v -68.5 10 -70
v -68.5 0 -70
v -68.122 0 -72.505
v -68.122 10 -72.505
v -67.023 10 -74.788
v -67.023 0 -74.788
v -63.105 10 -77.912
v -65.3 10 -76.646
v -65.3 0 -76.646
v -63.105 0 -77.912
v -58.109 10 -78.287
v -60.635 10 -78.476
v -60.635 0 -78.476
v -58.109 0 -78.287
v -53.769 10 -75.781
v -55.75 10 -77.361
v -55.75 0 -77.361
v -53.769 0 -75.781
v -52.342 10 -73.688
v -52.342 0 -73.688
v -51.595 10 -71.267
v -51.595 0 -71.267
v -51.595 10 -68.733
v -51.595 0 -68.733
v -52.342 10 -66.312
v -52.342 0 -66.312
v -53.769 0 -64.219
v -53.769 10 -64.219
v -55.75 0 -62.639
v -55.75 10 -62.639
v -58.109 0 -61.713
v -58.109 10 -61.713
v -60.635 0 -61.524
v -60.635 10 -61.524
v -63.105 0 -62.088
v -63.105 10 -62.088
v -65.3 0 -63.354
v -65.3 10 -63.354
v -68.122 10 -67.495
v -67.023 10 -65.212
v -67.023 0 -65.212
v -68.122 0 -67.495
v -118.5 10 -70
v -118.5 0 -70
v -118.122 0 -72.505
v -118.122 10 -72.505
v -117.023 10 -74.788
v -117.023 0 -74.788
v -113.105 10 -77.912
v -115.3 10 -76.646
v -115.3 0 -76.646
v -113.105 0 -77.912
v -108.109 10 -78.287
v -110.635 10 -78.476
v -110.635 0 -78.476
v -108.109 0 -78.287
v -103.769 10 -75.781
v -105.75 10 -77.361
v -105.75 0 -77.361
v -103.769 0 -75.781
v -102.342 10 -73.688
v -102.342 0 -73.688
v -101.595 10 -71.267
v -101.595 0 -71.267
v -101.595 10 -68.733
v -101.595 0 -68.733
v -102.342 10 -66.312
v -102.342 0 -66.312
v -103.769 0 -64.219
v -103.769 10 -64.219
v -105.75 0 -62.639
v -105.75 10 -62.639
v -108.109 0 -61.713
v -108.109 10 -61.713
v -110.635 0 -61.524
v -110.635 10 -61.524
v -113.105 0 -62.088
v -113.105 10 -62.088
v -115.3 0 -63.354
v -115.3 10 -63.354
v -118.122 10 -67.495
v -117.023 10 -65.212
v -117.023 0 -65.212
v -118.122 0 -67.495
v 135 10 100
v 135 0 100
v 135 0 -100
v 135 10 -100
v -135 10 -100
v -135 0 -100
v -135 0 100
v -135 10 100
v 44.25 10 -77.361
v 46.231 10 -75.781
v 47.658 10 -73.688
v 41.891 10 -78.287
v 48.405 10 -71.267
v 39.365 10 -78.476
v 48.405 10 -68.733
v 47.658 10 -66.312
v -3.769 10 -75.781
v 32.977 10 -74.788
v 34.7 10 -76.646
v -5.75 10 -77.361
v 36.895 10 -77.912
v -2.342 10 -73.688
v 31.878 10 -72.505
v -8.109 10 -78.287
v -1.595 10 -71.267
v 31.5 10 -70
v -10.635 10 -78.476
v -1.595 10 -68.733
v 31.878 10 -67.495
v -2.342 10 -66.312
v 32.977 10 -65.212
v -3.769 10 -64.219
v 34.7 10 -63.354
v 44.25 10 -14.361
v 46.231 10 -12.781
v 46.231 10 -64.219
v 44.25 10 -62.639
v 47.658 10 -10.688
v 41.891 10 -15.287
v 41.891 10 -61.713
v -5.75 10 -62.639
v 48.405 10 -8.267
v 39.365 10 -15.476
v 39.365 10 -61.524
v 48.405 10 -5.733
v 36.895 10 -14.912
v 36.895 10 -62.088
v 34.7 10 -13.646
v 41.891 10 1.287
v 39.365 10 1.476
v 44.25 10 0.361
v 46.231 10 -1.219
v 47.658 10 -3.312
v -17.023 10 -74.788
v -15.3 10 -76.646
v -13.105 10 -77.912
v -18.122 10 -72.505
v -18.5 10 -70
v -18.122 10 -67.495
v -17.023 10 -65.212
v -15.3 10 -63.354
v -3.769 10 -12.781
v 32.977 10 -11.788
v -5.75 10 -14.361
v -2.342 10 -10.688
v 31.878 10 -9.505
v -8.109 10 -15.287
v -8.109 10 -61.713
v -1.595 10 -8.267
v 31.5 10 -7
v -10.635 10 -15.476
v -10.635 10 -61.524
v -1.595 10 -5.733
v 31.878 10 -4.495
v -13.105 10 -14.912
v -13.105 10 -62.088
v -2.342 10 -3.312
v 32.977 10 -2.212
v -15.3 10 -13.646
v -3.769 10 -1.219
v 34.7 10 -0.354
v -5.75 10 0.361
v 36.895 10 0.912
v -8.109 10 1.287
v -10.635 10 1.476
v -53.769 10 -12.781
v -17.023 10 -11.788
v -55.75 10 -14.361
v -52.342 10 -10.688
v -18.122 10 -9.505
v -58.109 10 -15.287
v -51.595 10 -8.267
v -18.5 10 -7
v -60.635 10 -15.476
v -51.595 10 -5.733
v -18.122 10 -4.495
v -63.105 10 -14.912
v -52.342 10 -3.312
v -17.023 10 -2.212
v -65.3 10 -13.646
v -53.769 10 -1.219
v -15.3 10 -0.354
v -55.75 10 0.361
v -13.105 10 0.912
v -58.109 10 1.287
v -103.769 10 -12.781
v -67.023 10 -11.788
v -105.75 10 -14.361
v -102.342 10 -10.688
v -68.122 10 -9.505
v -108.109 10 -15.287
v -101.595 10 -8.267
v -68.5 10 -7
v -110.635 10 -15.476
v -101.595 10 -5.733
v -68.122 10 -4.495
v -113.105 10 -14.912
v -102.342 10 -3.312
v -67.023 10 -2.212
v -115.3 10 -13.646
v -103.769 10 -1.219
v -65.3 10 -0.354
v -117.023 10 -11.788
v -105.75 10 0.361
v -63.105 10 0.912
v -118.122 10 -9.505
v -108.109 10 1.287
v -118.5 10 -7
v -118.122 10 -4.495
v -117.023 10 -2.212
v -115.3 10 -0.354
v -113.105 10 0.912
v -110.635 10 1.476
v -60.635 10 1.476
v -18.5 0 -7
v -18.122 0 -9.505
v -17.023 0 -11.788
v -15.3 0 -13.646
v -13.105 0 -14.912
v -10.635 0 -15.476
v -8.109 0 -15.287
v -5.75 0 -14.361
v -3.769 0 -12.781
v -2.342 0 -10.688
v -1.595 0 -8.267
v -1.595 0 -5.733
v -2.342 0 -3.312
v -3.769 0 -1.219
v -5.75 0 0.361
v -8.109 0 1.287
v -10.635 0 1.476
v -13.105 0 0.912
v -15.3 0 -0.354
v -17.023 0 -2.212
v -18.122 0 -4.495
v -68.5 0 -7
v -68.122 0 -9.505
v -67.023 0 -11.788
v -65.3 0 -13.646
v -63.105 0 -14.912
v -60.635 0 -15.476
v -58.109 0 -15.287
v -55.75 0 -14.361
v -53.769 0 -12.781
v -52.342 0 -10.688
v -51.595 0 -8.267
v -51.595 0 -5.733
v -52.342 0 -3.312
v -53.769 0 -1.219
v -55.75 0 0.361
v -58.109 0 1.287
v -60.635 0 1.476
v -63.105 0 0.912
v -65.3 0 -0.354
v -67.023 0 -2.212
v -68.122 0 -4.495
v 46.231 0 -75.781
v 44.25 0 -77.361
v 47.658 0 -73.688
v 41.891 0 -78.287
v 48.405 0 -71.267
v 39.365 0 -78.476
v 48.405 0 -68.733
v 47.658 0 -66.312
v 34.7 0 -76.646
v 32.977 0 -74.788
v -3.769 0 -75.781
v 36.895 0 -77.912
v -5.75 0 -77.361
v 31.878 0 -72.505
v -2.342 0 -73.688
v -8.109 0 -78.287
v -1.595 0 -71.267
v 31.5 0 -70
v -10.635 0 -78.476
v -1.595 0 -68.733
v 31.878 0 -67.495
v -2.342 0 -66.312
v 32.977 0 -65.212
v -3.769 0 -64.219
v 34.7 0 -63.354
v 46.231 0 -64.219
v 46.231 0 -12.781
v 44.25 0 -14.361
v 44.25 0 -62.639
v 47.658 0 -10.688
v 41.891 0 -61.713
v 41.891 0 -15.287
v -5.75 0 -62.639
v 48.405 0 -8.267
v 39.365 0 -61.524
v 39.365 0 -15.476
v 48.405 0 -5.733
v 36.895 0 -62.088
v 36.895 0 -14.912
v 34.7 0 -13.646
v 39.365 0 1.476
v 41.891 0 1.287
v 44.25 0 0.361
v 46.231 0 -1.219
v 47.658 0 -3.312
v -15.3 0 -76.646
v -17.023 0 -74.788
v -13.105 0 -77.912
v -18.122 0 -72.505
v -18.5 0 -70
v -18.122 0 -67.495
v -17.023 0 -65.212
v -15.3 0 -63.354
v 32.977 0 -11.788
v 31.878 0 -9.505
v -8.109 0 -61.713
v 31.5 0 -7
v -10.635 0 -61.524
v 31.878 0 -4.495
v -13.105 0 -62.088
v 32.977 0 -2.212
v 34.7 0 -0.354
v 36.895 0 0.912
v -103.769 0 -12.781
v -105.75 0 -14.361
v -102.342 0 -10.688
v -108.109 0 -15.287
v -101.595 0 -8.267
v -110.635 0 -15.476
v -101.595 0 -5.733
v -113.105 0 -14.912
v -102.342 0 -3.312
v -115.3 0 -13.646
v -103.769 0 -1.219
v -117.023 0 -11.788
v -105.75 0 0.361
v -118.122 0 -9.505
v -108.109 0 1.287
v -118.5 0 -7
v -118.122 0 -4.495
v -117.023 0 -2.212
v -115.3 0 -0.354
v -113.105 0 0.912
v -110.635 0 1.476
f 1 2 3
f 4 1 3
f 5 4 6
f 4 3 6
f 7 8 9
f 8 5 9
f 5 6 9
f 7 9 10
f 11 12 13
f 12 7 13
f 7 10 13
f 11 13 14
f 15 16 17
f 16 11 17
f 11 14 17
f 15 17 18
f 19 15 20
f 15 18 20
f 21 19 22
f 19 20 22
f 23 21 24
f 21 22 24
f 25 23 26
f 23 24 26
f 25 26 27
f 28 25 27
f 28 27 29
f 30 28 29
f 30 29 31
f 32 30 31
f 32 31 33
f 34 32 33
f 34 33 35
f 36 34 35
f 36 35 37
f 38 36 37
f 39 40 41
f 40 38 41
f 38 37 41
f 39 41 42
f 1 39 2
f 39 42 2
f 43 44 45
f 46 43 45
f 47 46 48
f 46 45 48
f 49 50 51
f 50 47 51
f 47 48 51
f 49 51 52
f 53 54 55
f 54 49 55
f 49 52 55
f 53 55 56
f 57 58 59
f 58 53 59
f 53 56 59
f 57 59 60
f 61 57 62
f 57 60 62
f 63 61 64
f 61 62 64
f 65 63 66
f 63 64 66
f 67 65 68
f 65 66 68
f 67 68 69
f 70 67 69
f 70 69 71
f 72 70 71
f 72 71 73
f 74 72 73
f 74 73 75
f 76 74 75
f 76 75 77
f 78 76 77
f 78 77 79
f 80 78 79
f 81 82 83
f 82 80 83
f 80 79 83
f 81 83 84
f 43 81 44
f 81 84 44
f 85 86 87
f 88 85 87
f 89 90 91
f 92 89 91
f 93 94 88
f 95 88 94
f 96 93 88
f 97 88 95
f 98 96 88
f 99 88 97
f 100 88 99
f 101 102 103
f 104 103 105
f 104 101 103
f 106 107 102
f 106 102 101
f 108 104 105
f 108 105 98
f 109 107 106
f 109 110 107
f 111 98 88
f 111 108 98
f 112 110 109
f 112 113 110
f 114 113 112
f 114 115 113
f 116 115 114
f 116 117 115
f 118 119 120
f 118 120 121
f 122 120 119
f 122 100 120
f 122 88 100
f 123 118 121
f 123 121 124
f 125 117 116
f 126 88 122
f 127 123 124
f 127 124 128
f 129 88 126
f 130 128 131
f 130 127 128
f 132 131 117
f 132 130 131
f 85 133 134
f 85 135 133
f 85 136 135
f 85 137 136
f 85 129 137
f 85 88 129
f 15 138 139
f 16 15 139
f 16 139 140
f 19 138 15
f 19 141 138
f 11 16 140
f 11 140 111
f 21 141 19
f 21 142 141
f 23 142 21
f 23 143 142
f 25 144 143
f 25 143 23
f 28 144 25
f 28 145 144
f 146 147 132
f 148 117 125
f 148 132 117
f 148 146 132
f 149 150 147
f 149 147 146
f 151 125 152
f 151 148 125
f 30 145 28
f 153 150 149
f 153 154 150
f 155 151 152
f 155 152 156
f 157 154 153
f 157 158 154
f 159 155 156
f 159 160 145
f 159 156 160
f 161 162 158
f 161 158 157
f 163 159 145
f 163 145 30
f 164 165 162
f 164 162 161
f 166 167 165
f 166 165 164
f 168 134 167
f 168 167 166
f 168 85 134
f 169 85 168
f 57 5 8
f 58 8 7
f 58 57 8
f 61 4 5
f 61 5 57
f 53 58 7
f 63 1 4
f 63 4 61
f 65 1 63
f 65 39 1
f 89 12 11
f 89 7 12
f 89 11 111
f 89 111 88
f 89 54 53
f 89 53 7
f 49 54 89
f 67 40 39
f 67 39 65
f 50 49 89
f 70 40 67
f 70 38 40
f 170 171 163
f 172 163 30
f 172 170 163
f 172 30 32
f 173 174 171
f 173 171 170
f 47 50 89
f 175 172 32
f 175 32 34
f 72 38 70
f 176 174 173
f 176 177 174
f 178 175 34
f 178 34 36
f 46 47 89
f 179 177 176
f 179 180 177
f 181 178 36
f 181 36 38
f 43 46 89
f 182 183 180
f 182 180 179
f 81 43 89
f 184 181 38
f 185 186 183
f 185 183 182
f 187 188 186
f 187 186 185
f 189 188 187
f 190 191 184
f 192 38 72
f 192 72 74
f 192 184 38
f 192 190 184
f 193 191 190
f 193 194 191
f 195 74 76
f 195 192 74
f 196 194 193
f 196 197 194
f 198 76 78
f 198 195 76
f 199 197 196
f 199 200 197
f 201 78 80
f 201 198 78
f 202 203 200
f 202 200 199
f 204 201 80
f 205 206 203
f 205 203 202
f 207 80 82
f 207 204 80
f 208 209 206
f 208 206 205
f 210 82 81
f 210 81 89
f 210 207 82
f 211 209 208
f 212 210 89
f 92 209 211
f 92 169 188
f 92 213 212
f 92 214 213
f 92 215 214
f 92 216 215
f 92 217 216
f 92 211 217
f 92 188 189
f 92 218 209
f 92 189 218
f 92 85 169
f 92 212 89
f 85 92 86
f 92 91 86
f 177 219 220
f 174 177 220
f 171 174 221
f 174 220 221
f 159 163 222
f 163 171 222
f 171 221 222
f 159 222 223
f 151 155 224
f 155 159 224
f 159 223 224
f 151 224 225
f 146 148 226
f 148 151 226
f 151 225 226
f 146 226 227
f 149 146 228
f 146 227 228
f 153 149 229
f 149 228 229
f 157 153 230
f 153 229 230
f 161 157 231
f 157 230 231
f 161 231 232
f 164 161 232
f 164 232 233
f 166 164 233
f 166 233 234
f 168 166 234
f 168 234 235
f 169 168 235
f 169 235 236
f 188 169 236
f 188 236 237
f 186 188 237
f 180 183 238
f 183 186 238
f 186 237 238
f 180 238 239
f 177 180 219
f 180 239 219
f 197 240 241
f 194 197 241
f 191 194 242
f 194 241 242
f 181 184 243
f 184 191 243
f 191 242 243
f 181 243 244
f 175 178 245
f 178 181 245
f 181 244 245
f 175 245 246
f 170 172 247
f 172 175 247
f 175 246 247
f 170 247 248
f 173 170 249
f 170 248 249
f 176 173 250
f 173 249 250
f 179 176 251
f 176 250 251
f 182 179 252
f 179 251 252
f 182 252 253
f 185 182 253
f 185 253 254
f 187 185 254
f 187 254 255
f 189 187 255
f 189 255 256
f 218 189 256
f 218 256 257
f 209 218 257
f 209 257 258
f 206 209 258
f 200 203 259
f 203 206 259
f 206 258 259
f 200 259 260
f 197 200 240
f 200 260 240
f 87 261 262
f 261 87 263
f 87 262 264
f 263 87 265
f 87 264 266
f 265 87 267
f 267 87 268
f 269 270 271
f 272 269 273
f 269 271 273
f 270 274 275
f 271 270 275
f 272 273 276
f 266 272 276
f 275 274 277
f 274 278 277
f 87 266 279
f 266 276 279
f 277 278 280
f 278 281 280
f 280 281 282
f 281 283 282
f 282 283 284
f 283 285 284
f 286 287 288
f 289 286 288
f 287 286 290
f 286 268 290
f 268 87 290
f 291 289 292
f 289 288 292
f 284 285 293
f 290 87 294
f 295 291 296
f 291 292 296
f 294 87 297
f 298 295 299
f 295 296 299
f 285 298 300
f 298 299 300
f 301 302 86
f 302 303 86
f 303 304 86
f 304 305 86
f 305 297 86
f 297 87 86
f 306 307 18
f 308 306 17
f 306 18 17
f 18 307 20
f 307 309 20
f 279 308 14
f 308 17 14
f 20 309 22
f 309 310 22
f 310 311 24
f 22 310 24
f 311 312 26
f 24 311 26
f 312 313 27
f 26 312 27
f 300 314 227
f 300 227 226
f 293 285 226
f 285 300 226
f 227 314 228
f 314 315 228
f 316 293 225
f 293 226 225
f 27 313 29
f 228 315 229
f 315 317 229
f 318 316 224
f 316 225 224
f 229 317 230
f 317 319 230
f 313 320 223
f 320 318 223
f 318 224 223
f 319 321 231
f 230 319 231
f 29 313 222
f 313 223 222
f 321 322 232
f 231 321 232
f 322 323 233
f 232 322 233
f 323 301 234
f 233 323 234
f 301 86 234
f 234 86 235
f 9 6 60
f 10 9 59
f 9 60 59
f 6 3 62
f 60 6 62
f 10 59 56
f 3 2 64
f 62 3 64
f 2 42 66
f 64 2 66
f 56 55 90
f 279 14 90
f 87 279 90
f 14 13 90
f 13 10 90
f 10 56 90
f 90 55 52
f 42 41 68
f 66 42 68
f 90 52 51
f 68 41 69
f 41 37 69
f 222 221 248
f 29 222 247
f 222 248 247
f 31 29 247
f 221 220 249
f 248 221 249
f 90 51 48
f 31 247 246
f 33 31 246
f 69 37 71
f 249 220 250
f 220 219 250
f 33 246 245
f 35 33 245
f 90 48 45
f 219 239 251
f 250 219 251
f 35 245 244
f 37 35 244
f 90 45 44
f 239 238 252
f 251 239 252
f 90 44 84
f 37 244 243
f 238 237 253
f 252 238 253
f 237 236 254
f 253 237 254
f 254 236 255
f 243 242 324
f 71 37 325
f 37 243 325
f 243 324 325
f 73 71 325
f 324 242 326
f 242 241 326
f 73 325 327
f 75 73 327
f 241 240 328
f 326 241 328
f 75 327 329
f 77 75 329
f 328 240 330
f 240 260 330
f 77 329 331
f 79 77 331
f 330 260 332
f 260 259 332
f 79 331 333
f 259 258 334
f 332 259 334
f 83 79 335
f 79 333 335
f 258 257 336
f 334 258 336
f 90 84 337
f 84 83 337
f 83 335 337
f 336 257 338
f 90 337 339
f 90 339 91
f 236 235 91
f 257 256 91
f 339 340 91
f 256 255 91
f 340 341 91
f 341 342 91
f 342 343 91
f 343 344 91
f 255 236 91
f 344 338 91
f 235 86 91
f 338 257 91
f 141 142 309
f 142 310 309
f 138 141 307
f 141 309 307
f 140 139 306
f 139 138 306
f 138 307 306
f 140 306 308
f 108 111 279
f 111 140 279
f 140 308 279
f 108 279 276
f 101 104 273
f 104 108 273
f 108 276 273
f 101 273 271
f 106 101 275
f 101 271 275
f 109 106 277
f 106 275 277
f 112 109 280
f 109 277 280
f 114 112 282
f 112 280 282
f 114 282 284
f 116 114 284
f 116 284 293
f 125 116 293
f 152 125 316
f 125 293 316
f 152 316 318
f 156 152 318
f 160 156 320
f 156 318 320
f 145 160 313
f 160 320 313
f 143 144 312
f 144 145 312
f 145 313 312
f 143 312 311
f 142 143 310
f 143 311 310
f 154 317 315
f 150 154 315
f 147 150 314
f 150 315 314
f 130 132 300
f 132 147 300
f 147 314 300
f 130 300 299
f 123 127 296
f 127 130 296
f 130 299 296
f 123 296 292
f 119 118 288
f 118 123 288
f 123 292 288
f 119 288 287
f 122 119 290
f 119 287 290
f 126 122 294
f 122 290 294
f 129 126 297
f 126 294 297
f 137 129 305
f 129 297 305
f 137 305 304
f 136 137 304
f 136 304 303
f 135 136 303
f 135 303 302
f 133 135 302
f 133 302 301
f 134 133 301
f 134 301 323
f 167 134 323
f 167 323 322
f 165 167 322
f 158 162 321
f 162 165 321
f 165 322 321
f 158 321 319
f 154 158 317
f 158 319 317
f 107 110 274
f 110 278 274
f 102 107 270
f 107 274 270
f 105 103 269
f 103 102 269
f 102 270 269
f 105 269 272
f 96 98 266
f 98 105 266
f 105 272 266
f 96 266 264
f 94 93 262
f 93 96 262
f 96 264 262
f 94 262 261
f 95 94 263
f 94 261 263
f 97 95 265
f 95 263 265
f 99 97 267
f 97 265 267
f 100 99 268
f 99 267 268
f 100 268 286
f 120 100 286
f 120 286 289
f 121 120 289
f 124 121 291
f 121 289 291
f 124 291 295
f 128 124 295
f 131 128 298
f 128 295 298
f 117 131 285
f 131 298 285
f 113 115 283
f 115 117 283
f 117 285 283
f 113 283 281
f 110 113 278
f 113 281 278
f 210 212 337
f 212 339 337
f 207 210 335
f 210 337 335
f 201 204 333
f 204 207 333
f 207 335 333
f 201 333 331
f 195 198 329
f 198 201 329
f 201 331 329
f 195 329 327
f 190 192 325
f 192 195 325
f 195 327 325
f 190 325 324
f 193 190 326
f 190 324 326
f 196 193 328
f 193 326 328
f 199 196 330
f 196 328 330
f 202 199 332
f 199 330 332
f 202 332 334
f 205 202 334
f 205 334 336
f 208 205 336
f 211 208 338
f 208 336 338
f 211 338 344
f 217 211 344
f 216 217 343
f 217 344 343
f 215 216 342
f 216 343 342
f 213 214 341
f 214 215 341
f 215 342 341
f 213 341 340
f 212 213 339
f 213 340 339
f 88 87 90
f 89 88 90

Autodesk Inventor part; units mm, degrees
ref_plane "YZ Plane" through (0, 0, 0) normal (1, 0, 0) x (0, 1, 0)
ref_plane "XZ Plane" through (0, 0, 0) normal (0, 1, 0) x (-1, 0, 0)
ref_plane "XY Plane" through (0, 0, 0) normal (0, 0, 1) x (1, 0, 0)
sketch "Эскиз1" plane through (0, 0, 0) normal (0, 1, 0) x (-1, 0, 0)
  line L0 (-135, -100) -> (135, -100)
  line L1 (135, -100) -> (135, 100)
  line L2 (135, 100) -> (-135, 100)
  line L3 (-135, 100) -> (-135, -100)
  line L4 (-135, -100) -> (135, 100) construction
  line L5 (135, -100) -> (-135, 100) construction
  circle A0 centre (110, -70) radius 8.5
  circle A1 centre (110, -7) radius 8.5
  circle A2 centre (60, -7) radius 8.5
  circle A3 centre (60, -70) radius 8.5
  circle A4 centre (10, -7) radius 8.5
  circle A5 centre (10, -70) radius 8.5
  circle A6 centre (-40, -7) radius 8.5
  circle A7 centre (-40, -70) radius 8.5
  point P0 (0, 0)
  dimension "d0" = 270
  dimension "d1" = 200
  dimension "d2" = 30
  dimension "d3" = 63
  dimension "d4" = 95
  dimension "d5" = 50
  dimension "d6" = 50
  dimension "d7" = 50
  dimension "d8" = 17
extrude "Пластина1" add sketch "Эскиз1" along normal blind 10
equation "\"d6\" = d5"
equation "\"d7\" = d6"
equation "\"d9\" = Толщина"
equation "\"Глубина_просечки\" = 0.5 * Толщина"
equation "\"Толщина\" = 10"
properties part number "Lift.03.01.00.02" material "Сталь нержавеющая, 440C"
